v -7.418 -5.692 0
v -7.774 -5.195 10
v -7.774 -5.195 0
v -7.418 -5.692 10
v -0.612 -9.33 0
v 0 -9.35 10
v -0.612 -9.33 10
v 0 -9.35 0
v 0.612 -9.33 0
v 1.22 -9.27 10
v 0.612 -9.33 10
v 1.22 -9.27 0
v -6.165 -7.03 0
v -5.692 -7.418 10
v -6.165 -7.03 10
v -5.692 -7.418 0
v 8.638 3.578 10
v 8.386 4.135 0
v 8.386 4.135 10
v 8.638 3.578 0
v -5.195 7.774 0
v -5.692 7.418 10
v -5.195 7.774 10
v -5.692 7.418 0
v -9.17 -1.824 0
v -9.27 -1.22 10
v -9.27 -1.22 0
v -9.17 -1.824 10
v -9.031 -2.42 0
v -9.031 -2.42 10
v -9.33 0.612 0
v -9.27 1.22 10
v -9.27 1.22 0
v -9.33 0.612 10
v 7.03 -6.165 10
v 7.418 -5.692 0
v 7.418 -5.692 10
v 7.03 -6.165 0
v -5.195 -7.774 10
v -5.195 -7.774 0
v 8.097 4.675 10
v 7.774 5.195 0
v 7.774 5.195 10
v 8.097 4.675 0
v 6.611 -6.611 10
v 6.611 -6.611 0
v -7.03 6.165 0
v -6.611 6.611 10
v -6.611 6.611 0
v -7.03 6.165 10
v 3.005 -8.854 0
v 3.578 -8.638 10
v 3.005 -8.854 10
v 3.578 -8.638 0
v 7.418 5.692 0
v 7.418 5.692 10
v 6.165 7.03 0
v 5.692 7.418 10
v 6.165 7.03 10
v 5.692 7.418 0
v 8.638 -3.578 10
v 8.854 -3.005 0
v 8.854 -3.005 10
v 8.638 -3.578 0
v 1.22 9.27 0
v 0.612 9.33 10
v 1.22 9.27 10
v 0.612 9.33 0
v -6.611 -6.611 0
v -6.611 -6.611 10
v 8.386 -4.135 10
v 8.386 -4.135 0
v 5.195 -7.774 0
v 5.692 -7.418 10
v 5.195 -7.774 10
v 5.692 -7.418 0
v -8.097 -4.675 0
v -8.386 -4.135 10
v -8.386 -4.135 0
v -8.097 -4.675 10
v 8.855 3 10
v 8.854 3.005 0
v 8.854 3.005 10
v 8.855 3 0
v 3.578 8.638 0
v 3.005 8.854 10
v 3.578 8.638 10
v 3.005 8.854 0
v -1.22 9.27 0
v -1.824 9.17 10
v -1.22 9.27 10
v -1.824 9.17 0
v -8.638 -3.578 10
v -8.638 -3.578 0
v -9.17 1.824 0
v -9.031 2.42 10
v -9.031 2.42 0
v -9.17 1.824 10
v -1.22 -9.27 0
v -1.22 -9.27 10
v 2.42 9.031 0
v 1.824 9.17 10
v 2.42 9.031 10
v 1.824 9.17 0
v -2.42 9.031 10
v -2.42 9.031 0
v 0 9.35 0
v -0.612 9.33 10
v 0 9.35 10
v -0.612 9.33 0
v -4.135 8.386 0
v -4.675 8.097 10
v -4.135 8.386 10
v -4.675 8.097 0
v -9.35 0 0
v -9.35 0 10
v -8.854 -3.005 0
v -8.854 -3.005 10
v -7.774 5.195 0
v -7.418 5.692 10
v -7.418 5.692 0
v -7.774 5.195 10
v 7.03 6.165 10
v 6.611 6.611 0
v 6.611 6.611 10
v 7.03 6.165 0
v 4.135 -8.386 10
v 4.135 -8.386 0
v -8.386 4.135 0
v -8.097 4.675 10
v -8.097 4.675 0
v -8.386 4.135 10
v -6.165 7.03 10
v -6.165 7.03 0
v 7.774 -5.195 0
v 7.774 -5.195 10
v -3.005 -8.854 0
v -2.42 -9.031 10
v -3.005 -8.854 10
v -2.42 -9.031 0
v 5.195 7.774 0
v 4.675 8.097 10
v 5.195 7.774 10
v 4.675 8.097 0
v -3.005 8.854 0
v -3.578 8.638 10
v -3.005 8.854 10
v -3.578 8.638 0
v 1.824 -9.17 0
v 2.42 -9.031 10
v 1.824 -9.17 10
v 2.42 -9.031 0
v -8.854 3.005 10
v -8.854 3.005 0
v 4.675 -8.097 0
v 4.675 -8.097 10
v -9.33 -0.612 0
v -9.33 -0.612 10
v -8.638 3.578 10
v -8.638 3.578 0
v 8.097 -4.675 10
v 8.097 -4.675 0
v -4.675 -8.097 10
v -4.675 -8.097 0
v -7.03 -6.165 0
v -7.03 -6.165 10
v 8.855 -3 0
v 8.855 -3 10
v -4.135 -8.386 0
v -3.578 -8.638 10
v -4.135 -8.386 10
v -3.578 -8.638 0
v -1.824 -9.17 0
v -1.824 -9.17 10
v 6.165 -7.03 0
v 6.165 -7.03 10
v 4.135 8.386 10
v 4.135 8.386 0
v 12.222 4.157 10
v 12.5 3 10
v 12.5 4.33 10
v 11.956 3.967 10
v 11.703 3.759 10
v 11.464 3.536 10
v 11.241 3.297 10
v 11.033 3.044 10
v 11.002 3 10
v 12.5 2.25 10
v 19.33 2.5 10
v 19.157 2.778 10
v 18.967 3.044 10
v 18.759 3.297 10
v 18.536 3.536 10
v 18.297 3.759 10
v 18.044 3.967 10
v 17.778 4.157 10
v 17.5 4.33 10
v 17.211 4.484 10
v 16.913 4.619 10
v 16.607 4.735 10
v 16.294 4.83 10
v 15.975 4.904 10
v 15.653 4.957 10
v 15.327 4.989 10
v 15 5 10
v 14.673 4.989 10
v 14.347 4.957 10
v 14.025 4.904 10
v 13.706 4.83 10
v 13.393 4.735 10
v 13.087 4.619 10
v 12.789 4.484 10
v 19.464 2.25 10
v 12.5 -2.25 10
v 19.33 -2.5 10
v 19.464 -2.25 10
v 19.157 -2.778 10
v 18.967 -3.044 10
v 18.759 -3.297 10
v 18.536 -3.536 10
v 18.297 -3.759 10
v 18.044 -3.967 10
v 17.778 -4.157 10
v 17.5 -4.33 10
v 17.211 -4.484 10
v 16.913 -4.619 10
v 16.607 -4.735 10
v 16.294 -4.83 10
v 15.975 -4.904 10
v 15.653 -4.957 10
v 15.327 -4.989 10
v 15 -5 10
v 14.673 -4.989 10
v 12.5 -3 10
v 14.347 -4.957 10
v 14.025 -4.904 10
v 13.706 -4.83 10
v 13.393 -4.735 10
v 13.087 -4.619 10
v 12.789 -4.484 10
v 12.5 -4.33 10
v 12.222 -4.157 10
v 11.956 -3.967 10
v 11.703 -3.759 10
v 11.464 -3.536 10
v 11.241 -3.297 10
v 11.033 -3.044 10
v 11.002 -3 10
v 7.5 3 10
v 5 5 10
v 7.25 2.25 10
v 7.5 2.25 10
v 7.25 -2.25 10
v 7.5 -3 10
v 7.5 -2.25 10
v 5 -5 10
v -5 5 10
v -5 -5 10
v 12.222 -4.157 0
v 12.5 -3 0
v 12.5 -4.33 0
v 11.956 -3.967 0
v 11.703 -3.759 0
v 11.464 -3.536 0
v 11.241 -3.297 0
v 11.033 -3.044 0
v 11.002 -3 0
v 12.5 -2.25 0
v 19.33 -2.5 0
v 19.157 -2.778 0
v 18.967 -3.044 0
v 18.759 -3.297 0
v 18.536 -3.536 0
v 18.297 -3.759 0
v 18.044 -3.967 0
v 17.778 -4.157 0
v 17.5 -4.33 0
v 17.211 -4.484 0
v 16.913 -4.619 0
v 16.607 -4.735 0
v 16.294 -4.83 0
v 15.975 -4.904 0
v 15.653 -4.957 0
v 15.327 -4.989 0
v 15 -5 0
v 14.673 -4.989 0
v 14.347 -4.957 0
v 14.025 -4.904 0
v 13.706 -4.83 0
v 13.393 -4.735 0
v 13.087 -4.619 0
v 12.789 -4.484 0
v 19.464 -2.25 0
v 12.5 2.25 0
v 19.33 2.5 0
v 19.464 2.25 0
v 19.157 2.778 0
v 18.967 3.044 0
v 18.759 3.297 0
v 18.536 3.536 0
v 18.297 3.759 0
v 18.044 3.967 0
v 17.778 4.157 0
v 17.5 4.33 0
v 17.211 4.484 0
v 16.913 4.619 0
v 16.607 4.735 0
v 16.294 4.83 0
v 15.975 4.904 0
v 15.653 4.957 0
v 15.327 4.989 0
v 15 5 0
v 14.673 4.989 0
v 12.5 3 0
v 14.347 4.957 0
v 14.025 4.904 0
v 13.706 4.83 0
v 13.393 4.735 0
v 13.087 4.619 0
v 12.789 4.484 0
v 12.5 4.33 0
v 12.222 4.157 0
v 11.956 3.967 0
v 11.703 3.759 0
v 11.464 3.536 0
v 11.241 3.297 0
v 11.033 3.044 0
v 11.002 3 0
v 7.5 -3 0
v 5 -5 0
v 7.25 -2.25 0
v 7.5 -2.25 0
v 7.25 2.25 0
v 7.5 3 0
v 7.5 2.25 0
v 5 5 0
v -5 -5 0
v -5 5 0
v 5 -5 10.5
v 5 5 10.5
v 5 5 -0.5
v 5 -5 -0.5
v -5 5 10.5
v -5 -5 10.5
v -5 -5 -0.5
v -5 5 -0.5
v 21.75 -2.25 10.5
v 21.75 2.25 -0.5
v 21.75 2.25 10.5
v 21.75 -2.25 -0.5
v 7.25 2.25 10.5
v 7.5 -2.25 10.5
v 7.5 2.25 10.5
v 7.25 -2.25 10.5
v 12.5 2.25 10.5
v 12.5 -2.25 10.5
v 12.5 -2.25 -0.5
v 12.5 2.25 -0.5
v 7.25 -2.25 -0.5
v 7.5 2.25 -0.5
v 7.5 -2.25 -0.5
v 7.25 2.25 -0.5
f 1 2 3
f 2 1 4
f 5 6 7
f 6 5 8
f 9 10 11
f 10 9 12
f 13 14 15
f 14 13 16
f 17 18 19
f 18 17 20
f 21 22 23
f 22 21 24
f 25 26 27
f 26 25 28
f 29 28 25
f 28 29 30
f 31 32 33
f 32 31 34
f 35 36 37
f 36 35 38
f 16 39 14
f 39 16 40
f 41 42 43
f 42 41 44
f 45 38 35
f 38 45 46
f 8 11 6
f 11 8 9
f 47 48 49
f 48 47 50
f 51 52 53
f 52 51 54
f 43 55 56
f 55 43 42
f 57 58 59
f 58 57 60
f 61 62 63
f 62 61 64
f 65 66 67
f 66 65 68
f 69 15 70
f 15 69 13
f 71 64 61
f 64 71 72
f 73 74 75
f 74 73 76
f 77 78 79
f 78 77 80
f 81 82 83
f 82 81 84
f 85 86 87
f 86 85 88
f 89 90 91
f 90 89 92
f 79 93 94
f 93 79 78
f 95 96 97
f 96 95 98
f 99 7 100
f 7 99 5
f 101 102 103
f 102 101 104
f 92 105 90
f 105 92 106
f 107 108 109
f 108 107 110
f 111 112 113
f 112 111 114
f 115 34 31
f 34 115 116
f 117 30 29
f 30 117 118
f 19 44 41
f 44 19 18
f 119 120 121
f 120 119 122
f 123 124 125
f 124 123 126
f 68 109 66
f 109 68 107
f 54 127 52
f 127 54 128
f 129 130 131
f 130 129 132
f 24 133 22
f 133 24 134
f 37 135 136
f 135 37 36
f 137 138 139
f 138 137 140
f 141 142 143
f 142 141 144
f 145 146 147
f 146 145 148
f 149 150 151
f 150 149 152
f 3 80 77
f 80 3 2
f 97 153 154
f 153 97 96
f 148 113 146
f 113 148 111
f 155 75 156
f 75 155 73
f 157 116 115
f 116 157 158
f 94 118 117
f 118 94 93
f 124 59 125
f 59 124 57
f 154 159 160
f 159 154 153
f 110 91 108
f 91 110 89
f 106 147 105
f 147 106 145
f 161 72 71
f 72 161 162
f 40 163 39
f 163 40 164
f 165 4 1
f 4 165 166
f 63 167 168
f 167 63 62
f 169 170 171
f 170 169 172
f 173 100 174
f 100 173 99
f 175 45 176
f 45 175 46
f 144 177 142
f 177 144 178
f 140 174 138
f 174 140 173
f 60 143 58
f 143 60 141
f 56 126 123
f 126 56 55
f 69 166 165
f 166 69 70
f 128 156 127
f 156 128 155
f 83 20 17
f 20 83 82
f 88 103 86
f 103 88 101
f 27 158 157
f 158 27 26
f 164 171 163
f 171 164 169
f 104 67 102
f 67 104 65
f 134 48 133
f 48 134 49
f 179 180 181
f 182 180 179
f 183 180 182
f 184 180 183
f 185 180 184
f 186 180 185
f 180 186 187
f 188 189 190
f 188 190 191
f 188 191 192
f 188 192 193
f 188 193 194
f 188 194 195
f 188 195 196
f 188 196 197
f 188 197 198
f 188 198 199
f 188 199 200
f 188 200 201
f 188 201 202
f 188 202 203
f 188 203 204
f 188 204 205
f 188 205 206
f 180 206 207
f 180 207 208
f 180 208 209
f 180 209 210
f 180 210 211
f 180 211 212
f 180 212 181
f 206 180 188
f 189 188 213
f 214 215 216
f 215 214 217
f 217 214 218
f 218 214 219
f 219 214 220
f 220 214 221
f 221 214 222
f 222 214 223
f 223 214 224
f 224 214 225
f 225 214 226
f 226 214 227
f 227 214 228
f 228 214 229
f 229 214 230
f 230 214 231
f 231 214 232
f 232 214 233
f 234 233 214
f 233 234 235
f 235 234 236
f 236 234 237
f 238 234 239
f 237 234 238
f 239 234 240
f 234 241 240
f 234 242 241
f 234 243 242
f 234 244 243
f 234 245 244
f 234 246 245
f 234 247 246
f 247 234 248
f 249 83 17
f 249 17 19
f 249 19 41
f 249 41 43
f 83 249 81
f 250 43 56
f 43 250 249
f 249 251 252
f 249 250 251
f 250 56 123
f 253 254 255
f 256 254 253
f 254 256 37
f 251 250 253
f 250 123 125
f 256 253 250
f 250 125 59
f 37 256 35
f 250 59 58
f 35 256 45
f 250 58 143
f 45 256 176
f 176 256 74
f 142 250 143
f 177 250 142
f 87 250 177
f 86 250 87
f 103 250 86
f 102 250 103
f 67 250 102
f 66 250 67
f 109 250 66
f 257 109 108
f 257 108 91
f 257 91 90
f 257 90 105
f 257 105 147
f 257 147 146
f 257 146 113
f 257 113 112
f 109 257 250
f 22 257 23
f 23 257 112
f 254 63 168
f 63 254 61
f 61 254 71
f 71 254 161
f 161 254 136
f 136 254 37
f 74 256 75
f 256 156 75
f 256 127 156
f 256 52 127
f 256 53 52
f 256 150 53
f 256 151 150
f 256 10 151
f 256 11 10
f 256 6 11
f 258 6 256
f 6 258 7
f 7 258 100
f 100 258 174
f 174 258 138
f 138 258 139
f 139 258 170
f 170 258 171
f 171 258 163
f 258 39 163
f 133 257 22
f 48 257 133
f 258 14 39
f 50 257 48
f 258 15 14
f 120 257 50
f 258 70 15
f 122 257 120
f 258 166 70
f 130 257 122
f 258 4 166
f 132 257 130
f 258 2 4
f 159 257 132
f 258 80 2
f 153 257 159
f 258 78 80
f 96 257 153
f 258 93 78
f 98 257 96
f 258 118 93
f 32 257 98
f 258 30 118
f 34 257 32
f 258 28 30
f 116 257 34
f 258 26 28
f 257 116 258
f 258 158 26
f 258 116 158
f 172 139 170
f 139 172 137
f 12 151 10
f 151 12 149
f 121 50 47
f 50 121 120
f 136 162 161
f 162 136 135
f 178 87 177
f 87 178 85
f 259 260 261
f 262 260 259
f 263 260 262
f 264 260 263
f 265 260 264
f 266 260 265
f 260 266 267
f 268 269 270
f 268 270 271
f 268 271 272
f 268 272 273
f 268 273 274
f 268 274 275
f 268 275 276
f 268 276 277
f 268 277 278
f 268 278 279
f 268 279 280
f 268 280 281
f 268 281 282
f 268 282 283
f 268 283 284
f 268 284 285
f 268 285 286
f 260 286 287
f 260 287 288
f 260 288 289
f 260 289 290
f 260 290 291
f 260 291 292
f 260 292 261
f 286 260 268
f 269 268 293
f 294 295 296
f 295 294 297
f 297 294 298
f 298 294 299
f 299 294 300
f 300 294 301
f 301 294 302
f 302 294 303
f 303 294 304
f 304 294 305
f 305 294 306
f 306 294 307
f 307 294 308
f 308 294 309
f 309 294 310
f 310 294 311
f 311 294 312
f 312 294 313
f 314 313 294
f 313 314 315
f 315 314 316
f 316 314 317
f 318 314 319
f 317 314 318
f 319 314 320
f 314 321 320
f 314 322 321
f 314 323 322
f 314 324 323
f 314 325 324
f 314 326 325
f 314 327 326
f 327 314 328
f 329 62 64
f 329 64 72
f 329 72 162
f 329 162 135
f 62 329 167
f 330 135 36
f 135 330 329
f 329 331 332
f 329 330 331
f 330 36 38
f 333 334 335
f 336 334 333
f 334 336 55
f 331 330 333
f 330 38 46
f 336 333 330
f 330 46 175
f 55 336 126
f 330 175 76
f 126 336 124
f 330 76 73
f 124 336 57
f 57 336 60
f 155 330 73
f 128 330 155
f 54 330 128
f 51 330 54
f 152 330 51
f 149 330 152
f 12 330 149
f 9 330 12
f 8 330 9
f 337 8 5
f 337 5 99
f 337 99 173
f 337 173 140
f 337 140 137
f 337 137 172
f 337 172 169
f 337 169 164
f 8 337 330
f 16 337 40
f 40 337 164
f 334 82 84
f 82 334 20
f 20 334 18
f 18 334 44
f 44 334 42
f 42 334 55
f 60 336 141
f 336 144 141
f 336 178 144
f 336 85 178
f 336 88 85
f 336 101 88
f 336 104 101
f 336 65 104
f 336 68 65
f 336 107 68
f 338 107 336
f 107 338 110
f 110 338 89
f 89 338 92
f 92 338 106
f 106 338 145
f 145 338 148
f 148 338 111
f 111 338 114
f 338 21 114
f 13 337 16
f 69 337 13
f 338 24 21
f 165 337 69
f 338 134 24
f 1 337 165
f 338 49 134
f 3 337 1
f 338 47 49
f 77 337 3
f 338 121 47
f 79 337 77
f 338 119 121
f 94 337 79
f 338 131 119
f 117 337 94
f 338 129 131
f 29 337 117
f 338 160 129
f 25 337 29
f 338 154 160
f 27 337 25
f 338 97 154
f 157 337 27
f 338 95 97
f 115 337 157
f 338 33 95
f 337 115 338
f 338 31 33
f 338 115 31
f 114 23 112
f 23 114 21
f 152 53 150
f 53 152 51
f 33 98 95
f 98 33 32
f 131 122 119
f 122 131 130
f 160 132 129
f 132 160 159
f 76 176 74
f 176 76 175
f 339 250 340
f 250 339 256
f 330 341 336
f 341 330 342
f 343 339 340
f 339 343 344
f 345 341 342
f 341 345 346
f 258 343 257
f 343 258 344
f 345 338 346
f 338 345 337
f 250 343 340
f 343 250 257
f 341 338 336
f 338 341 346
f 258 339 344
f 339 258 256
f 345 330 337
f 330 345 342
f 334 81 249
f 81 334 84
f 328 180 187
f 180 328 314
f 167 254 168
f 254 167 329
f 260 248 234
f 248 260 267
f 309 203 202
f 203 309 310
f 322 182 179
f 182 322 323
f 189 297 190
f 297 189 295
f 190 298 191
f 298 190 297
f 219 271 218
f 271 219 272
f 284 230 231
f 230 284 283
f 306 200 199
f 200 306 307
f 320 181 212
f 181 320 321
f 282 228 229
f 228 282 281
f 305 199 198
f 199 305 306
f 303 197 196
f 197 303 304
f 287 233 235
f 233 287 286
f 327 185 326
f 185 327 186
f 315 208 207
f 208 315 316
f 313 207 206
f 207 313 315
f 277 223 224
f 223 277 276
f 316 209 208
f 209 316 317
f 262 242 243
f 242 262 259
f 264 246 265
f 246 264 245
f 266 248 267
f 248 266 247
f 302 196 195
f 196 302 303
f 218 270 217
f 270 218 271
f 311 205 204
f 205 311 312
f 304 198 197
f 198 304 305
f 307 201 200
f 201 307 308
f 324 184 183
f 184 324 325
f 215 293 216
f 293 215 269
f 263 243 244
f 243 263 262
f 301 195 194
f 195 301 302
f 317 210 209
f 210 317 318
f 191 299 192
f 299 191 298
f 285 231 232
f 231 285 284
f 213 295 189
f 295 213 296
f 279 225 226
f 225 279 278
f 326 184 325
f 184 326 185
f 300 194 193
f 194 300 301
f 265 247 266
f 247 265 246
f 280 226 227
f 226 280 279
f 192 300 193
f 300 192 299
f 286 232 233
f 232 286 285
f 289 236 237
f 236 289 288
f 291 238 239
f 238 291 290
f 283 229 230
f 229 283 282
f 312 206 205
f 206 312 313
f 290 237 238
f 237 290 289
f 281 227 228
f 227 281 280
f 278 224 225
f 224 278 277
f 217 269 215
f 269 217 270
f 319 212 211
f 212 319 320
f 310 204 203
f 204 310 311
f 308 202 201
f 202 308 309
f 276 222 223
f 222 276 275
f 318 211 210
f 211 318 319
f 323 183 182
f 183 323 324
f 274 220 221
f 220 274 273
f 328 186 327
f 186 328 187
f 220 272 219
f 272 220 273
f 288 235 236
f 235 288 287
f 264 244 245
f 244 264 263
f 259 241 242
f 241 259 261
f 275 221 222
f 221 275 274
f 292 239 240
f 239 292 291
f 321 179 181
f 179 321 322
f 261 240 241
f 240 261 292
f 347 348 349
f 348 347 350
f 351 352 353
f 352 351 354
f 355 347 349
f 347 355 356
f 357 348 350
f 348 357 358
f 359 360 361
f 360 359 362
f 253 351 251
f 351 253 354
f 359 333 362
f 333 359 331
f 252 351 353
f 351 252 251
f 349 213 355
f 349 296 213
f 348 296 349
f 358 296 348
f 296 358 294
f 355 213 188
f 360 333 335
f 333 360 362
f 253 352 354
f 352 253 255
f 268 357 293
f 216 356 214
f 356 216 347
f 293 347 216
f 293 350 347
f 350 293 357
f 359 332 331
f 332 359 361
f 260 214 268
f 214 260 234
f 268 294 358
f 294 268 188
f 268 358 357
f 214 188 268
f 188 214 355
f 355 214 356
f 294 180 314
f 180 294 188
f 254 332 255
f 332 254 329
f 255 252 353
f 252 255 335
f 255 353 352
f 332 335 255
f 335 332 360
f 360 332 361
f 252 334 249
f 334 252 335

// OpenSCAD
// Snap-on tubing clip for 12.7 mm lab stand rod
// Print orientation: flat on bed, extruded in +Z

$fn = 96;

// ---- Dimensions (mm) ----
rod_d        = 12.7;   // stand rod diameter
wall_r       = 3;      // rod ring wall thickness
opening_w    = 10;     // rod ring opening width (-X side)
bridge_x0    = 8;      // bridge start (X)
bridge_x1    = 12;     // bridge end (X)
bridge_w     = 6;      // bridge width (Y)
tube_d       = 6;      // tubing ring diameter
tube_wall    = 2;      // tubing ring wall thickness
tube_open_w  = 4.5;    // tubing opening width (+X side)
tube_offset  = 15;     // tubing ring centre X
height       = 10;     // extrusion height (Z)
eps          = 0.5;    // cutter overshoot

// ---- Model ----
difference() {
    union() {
        // Rod ring
        cylinder(d = rod_d + 2 * wall_r, h = height);
        // Opening in rod ring
        translate([-opening_w / 2, -opening_w / 2, -eps])
            cube([opening_w, opening_w, height + 2 * eps]);
        // Bridge
        translate([bridge_x0, -bridge_w / 2, 0])
            cube([bridge_x1 - bridge_x0, bridge_w, height]);
        // Tubing ring
        translate([tube_offset, 0, 0])
            cylinder(d = tube_d + 2 * tube_wall, h = height);
        // Opening in tubing ring
        translate([tube_offset + tube_open_w / 2 - tube_d - 2 * tube_wall,
                   -tube_open_w / 2, -eps])
            cube([tube_open_w + tube_d + 2 * tube_wall,
                  tube_open_w,
                  height + 2 * eps]);
    }
    // Remove overlapping bridge material from rings
    translate([bridge_x0 - eps, -bridge_w / 2, -eps])
        cube([bridge_x1 - bridge_x0 + 2 * eps,
              bridge_w,
              height + 2 * eps]);
}
